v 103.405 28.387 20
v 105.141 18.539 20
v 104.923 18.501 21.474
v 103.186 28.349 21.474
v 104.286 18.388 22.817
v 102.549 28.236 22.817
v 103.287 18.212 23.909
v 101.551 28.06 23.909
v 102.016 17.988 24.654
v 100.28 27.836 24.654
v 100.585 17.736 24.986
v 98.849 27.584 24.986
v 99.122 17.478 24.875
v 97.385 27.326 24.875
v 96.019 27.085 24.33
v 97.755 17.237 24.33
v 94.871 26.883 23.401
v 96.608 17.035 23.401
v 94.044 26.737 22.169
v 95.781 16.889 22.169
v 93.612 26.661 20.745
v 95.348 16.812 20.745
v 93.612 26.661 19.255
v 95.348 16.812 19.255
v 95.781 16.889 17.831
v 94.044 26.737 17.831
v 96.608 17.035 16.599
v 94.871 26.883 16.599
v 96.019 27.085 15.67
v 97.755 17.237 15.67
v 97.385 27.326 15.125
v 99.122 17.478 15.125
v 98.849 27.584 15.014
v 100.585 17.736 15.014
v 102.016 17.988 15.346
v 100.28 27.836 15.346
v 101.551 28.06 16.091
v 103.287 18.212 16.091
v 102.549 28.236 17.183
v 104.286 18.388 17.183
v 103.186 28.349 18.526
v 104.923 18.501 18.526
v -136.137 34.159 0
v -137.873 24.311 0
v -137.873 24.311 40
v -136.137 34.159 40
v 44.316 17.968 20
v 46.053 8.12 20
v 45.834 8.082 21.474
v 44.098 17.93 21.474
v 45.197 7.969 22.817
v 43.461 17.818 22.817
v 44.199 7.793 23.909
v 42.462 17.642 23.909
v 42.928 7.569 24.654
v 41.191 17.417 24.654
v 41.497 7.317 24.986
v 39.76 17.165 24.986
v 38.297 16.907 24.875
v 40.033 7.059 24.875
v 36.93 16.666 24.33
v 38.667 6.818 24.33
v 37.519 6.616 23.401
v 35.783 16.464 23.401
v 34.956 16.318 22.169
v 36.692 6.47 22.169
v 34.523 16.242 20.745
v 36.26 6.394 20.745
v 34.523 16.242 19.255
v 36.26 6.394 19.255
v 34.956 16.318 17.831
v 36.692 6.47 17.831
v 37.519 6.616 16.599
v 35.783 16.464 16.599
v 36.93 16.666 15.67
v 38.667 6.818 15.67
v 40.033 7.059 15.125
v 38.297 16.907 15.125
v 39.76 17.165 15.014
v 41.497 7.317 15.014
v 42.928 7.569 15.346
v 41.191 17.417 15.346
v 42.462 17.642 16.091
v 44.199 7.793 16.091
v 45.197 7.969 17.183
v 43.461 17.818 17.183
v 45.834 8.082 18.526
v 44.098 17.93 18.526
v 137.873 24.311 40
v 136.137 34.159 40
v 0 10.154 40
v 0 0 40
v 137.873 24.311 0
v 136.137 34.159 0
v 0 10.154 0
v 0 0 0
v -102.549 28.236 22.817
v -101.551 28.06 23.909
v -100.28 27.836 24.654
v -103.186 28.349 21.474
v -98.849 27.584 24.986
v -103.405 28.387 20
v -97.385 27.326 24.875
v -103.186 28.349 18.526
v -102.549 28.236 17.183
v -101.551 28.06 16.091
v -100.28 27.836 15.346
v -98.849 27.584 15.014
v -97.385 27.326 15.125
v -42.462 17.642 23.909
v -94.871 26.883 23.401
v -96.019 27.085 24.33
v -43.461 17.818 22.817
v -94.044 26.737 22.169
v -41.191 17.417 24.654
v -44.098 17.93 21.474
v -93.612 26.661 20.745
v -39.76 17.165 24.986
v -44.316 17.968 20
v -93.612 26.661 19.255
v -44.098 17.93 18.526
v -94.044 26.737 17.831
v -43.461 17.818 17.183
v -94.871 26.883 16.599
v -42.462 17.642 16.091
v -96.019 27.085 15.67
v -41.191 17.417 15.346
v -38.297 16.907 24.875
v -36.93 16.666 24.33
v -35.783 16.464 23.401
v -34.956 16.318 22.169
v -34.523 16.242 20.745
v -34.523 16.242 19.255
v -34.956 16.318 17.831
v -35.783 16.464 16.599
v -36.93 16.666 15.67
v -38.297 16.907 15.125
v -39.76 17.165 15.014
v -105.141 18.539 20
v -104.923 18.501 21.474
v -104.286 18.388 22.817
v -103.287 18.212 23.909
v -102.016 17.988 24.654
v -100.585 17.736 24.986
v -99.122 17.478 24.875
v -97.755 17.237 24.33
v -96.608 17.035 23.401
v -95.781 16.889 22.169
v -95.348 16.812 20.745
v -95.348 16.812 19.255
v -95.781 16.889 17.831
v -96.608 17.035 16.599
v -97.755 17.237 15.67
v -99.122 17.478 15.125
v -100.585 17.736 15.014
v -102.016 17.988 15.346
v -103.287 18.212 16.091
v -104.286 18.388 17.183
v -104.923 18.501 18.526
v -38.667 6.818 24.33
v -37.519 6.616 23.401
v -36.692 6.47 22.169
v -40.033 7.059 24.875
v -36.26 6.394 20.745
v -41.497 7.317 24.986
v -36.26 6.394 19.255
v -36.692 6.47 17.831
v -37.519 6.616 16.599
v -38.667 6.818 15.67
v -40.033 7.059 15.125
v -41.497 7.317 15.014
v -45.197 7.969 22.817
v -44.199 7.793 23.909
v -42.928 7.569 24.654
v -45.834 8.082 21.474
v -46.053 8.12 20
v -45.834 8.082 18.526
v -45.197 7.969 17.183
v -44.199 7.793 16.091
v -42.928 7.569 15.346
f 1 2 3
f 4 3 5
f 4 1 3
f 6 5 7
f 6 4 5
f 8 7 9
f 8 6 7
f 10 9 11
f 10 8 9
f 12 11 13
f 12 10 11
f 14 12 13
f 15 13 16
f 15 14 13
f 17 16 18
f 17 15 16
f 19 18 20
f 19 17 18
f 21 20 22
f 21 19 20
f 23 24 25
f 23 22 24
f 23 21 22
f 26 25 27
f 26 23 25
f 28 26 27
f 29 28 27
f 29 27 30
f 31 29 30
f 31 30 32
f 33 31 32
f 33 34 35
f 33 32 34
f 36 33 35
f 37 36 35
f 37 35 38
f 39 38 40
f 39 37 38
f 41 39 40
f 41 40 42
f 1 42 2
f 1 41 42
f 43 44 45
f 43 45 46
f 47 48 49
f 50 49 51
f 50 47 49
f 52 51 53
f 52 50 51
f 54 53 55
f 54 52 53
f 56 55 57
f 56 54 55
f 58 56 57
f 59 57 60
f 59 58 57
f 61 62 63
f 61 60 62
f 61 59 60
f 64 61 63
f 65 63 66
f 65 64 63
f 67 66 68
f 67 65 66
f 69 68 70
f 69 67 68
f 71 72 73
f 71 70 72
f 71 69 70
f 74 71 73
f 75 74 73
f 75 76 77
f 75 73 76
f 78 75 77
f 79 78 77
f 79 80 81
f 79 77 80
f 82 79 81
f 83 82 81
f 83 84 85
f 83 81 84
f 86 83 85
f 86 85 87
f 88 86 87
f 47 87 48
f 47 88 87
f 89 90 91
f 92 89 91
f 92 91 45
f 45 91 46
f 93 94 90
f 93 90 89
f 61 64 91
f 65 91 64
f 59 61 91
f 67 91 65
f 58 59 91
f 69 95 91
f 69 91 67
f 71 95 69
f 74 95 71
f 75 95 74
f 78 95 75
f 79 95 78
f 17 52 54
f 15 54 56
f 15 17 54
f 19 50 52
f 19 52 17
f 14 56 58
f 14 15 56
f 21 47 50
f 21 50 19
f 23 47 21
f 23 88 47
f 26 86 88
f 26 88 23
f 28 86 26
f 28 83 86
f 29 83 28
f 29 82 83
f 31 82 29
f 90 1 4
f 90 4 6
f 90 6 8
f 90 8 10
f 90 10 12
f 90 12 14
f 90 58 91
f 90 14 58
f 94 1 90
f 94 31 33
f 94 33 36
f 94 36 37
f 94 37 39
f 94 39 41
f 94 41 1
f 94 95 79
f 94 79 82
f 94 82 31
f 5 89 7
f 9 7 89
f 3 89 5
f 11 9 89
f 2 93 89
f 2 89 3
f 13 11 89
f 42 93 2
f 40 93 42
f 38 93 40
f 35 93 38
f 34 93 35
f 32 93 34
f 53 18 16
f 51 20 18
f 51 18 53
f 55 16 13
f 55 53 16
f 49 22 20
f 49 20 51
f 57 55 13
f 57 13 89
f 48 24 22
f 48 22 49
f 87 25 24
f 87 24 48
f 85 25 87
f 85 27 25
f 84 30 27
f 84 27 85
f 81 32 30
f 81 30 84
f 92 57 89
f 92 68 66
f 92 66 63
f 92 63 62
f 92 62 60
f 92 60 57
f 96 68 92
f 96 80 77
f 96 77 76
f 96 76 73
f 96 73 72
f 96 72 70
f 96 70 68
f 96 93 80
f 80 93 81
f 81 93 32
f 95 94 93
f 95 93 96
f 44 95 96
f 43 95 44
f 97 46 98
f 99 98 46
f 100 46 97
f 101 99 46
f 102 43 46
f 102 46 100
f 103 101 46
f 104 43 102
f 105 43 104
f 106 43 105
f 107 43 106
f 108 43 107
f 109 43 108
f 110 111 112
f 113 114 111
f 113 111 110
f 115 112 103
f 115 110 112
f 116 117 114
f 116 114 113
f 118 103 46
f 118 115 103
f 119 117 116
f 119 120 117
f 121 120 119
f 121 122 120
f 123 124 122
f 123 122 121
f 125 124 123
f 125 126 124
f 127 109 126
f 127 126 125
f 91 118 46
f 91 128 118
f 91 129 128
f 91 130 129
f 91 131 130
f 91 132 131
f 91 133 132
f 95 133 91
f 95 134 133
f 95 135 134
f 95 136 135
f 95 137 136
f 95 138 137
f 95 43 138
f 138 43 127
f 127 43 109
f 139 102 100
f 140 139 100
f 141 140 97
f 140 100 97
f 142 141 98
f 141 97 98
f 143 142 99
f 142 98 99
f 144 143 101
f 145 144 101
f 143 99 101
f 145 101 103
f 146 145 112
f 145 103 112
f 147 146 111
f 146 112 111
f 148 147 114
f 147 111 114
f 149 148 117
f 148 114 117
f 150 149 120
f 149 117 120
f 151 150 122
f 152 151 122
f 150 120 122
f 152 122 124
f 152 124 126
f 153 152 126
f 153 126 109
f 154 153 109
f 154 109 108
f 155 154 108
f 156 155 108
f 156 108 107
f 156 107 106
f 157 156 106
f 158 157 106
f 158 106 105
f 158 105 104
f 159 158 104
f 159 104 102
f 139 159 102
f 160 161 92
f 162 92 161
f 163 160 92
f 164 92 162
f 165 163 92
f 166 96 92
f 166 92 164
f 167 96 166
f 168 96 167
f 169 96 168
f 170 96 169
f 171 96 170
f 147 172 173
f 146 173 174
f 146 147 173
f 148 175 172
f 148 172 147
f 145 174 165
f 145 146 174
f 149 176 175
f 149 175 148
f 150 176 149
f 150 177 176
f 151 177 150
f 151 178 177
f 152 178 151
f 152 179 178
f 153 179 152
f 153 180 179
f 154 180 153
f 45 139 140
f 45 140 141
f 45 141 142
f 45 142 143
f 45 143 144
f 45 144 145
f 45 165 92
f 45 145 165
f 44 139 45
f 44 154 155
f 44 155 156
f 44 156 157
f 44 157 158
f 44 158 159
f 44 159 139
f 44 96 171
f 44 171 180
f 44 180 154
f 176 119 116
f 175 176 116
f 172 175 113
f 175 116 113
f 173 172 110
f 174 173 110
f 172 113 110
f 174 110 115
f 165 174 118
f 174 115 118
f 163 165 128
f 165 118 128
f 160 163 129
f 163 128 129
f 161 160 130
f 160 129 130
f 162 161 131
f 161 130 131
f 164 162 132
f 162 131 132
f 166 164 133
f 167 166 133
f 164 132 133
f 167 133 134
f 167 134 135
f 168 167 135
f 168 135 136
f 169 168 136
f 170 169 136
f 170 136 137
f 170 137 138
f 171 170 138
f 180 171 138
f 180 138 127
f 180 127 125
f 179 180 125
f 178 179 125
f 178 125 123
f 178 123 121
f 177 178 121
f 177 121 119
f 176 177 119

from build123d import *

# Parameters (mm, degrees)
EXTRUDE_1_DEPTH     = 40
SKETCH_2_R          = 5
CUT_EXTRUDE_1_DEPTH = 148.24755879


with BuildPart() as part:
    # 草图1 → 凸台-拉伸1 (new body)
    with BuildSketch(Plane.XY):
        Polygon((0, 0), (-137.873085422, 24.310744873), (-136.136603645, 34.158822403), (0, 10.154266119), (136.136603645, 34.158822403), (137.873085422, 24.310744873), align=None)
    extrude(amount=EXTRUDE_1_DEPTH)

    # 草图2 → 切除-拉伸1 (cut, through all)
    with BuildSketch(Plane(origin=(1.736481777, 9.84807753, 0), x_dir=(0.984807753012208, -0.17364817766693144, 0), z_dir=(0.17364817766693144, 0.984807753012208, 0))):
        with Locations(Location((-41.763269807, -20, 0), (0, 0, 180))):
            Circle(SKETCH_2_R)
        with Locations(Location((-101.763269807, -20, 0), (0, 0, 180))):
            Circle(SKETCH_2_R)
    cut_extrude_1 = extrude(amount=-CUT_EXTRUDE_1_DEPTH, mode=Mode.SUBTRACT)

    # 镜向1: 切除-拉伸1 across plane
    add(cut_extrude_1.mirror(Plane(origin=(0, 0, 0), x_dir=(0, 0, 1), z_dir=(1, 0, 0))), mode=Mode.SUBTRACT)


solid = part.part
